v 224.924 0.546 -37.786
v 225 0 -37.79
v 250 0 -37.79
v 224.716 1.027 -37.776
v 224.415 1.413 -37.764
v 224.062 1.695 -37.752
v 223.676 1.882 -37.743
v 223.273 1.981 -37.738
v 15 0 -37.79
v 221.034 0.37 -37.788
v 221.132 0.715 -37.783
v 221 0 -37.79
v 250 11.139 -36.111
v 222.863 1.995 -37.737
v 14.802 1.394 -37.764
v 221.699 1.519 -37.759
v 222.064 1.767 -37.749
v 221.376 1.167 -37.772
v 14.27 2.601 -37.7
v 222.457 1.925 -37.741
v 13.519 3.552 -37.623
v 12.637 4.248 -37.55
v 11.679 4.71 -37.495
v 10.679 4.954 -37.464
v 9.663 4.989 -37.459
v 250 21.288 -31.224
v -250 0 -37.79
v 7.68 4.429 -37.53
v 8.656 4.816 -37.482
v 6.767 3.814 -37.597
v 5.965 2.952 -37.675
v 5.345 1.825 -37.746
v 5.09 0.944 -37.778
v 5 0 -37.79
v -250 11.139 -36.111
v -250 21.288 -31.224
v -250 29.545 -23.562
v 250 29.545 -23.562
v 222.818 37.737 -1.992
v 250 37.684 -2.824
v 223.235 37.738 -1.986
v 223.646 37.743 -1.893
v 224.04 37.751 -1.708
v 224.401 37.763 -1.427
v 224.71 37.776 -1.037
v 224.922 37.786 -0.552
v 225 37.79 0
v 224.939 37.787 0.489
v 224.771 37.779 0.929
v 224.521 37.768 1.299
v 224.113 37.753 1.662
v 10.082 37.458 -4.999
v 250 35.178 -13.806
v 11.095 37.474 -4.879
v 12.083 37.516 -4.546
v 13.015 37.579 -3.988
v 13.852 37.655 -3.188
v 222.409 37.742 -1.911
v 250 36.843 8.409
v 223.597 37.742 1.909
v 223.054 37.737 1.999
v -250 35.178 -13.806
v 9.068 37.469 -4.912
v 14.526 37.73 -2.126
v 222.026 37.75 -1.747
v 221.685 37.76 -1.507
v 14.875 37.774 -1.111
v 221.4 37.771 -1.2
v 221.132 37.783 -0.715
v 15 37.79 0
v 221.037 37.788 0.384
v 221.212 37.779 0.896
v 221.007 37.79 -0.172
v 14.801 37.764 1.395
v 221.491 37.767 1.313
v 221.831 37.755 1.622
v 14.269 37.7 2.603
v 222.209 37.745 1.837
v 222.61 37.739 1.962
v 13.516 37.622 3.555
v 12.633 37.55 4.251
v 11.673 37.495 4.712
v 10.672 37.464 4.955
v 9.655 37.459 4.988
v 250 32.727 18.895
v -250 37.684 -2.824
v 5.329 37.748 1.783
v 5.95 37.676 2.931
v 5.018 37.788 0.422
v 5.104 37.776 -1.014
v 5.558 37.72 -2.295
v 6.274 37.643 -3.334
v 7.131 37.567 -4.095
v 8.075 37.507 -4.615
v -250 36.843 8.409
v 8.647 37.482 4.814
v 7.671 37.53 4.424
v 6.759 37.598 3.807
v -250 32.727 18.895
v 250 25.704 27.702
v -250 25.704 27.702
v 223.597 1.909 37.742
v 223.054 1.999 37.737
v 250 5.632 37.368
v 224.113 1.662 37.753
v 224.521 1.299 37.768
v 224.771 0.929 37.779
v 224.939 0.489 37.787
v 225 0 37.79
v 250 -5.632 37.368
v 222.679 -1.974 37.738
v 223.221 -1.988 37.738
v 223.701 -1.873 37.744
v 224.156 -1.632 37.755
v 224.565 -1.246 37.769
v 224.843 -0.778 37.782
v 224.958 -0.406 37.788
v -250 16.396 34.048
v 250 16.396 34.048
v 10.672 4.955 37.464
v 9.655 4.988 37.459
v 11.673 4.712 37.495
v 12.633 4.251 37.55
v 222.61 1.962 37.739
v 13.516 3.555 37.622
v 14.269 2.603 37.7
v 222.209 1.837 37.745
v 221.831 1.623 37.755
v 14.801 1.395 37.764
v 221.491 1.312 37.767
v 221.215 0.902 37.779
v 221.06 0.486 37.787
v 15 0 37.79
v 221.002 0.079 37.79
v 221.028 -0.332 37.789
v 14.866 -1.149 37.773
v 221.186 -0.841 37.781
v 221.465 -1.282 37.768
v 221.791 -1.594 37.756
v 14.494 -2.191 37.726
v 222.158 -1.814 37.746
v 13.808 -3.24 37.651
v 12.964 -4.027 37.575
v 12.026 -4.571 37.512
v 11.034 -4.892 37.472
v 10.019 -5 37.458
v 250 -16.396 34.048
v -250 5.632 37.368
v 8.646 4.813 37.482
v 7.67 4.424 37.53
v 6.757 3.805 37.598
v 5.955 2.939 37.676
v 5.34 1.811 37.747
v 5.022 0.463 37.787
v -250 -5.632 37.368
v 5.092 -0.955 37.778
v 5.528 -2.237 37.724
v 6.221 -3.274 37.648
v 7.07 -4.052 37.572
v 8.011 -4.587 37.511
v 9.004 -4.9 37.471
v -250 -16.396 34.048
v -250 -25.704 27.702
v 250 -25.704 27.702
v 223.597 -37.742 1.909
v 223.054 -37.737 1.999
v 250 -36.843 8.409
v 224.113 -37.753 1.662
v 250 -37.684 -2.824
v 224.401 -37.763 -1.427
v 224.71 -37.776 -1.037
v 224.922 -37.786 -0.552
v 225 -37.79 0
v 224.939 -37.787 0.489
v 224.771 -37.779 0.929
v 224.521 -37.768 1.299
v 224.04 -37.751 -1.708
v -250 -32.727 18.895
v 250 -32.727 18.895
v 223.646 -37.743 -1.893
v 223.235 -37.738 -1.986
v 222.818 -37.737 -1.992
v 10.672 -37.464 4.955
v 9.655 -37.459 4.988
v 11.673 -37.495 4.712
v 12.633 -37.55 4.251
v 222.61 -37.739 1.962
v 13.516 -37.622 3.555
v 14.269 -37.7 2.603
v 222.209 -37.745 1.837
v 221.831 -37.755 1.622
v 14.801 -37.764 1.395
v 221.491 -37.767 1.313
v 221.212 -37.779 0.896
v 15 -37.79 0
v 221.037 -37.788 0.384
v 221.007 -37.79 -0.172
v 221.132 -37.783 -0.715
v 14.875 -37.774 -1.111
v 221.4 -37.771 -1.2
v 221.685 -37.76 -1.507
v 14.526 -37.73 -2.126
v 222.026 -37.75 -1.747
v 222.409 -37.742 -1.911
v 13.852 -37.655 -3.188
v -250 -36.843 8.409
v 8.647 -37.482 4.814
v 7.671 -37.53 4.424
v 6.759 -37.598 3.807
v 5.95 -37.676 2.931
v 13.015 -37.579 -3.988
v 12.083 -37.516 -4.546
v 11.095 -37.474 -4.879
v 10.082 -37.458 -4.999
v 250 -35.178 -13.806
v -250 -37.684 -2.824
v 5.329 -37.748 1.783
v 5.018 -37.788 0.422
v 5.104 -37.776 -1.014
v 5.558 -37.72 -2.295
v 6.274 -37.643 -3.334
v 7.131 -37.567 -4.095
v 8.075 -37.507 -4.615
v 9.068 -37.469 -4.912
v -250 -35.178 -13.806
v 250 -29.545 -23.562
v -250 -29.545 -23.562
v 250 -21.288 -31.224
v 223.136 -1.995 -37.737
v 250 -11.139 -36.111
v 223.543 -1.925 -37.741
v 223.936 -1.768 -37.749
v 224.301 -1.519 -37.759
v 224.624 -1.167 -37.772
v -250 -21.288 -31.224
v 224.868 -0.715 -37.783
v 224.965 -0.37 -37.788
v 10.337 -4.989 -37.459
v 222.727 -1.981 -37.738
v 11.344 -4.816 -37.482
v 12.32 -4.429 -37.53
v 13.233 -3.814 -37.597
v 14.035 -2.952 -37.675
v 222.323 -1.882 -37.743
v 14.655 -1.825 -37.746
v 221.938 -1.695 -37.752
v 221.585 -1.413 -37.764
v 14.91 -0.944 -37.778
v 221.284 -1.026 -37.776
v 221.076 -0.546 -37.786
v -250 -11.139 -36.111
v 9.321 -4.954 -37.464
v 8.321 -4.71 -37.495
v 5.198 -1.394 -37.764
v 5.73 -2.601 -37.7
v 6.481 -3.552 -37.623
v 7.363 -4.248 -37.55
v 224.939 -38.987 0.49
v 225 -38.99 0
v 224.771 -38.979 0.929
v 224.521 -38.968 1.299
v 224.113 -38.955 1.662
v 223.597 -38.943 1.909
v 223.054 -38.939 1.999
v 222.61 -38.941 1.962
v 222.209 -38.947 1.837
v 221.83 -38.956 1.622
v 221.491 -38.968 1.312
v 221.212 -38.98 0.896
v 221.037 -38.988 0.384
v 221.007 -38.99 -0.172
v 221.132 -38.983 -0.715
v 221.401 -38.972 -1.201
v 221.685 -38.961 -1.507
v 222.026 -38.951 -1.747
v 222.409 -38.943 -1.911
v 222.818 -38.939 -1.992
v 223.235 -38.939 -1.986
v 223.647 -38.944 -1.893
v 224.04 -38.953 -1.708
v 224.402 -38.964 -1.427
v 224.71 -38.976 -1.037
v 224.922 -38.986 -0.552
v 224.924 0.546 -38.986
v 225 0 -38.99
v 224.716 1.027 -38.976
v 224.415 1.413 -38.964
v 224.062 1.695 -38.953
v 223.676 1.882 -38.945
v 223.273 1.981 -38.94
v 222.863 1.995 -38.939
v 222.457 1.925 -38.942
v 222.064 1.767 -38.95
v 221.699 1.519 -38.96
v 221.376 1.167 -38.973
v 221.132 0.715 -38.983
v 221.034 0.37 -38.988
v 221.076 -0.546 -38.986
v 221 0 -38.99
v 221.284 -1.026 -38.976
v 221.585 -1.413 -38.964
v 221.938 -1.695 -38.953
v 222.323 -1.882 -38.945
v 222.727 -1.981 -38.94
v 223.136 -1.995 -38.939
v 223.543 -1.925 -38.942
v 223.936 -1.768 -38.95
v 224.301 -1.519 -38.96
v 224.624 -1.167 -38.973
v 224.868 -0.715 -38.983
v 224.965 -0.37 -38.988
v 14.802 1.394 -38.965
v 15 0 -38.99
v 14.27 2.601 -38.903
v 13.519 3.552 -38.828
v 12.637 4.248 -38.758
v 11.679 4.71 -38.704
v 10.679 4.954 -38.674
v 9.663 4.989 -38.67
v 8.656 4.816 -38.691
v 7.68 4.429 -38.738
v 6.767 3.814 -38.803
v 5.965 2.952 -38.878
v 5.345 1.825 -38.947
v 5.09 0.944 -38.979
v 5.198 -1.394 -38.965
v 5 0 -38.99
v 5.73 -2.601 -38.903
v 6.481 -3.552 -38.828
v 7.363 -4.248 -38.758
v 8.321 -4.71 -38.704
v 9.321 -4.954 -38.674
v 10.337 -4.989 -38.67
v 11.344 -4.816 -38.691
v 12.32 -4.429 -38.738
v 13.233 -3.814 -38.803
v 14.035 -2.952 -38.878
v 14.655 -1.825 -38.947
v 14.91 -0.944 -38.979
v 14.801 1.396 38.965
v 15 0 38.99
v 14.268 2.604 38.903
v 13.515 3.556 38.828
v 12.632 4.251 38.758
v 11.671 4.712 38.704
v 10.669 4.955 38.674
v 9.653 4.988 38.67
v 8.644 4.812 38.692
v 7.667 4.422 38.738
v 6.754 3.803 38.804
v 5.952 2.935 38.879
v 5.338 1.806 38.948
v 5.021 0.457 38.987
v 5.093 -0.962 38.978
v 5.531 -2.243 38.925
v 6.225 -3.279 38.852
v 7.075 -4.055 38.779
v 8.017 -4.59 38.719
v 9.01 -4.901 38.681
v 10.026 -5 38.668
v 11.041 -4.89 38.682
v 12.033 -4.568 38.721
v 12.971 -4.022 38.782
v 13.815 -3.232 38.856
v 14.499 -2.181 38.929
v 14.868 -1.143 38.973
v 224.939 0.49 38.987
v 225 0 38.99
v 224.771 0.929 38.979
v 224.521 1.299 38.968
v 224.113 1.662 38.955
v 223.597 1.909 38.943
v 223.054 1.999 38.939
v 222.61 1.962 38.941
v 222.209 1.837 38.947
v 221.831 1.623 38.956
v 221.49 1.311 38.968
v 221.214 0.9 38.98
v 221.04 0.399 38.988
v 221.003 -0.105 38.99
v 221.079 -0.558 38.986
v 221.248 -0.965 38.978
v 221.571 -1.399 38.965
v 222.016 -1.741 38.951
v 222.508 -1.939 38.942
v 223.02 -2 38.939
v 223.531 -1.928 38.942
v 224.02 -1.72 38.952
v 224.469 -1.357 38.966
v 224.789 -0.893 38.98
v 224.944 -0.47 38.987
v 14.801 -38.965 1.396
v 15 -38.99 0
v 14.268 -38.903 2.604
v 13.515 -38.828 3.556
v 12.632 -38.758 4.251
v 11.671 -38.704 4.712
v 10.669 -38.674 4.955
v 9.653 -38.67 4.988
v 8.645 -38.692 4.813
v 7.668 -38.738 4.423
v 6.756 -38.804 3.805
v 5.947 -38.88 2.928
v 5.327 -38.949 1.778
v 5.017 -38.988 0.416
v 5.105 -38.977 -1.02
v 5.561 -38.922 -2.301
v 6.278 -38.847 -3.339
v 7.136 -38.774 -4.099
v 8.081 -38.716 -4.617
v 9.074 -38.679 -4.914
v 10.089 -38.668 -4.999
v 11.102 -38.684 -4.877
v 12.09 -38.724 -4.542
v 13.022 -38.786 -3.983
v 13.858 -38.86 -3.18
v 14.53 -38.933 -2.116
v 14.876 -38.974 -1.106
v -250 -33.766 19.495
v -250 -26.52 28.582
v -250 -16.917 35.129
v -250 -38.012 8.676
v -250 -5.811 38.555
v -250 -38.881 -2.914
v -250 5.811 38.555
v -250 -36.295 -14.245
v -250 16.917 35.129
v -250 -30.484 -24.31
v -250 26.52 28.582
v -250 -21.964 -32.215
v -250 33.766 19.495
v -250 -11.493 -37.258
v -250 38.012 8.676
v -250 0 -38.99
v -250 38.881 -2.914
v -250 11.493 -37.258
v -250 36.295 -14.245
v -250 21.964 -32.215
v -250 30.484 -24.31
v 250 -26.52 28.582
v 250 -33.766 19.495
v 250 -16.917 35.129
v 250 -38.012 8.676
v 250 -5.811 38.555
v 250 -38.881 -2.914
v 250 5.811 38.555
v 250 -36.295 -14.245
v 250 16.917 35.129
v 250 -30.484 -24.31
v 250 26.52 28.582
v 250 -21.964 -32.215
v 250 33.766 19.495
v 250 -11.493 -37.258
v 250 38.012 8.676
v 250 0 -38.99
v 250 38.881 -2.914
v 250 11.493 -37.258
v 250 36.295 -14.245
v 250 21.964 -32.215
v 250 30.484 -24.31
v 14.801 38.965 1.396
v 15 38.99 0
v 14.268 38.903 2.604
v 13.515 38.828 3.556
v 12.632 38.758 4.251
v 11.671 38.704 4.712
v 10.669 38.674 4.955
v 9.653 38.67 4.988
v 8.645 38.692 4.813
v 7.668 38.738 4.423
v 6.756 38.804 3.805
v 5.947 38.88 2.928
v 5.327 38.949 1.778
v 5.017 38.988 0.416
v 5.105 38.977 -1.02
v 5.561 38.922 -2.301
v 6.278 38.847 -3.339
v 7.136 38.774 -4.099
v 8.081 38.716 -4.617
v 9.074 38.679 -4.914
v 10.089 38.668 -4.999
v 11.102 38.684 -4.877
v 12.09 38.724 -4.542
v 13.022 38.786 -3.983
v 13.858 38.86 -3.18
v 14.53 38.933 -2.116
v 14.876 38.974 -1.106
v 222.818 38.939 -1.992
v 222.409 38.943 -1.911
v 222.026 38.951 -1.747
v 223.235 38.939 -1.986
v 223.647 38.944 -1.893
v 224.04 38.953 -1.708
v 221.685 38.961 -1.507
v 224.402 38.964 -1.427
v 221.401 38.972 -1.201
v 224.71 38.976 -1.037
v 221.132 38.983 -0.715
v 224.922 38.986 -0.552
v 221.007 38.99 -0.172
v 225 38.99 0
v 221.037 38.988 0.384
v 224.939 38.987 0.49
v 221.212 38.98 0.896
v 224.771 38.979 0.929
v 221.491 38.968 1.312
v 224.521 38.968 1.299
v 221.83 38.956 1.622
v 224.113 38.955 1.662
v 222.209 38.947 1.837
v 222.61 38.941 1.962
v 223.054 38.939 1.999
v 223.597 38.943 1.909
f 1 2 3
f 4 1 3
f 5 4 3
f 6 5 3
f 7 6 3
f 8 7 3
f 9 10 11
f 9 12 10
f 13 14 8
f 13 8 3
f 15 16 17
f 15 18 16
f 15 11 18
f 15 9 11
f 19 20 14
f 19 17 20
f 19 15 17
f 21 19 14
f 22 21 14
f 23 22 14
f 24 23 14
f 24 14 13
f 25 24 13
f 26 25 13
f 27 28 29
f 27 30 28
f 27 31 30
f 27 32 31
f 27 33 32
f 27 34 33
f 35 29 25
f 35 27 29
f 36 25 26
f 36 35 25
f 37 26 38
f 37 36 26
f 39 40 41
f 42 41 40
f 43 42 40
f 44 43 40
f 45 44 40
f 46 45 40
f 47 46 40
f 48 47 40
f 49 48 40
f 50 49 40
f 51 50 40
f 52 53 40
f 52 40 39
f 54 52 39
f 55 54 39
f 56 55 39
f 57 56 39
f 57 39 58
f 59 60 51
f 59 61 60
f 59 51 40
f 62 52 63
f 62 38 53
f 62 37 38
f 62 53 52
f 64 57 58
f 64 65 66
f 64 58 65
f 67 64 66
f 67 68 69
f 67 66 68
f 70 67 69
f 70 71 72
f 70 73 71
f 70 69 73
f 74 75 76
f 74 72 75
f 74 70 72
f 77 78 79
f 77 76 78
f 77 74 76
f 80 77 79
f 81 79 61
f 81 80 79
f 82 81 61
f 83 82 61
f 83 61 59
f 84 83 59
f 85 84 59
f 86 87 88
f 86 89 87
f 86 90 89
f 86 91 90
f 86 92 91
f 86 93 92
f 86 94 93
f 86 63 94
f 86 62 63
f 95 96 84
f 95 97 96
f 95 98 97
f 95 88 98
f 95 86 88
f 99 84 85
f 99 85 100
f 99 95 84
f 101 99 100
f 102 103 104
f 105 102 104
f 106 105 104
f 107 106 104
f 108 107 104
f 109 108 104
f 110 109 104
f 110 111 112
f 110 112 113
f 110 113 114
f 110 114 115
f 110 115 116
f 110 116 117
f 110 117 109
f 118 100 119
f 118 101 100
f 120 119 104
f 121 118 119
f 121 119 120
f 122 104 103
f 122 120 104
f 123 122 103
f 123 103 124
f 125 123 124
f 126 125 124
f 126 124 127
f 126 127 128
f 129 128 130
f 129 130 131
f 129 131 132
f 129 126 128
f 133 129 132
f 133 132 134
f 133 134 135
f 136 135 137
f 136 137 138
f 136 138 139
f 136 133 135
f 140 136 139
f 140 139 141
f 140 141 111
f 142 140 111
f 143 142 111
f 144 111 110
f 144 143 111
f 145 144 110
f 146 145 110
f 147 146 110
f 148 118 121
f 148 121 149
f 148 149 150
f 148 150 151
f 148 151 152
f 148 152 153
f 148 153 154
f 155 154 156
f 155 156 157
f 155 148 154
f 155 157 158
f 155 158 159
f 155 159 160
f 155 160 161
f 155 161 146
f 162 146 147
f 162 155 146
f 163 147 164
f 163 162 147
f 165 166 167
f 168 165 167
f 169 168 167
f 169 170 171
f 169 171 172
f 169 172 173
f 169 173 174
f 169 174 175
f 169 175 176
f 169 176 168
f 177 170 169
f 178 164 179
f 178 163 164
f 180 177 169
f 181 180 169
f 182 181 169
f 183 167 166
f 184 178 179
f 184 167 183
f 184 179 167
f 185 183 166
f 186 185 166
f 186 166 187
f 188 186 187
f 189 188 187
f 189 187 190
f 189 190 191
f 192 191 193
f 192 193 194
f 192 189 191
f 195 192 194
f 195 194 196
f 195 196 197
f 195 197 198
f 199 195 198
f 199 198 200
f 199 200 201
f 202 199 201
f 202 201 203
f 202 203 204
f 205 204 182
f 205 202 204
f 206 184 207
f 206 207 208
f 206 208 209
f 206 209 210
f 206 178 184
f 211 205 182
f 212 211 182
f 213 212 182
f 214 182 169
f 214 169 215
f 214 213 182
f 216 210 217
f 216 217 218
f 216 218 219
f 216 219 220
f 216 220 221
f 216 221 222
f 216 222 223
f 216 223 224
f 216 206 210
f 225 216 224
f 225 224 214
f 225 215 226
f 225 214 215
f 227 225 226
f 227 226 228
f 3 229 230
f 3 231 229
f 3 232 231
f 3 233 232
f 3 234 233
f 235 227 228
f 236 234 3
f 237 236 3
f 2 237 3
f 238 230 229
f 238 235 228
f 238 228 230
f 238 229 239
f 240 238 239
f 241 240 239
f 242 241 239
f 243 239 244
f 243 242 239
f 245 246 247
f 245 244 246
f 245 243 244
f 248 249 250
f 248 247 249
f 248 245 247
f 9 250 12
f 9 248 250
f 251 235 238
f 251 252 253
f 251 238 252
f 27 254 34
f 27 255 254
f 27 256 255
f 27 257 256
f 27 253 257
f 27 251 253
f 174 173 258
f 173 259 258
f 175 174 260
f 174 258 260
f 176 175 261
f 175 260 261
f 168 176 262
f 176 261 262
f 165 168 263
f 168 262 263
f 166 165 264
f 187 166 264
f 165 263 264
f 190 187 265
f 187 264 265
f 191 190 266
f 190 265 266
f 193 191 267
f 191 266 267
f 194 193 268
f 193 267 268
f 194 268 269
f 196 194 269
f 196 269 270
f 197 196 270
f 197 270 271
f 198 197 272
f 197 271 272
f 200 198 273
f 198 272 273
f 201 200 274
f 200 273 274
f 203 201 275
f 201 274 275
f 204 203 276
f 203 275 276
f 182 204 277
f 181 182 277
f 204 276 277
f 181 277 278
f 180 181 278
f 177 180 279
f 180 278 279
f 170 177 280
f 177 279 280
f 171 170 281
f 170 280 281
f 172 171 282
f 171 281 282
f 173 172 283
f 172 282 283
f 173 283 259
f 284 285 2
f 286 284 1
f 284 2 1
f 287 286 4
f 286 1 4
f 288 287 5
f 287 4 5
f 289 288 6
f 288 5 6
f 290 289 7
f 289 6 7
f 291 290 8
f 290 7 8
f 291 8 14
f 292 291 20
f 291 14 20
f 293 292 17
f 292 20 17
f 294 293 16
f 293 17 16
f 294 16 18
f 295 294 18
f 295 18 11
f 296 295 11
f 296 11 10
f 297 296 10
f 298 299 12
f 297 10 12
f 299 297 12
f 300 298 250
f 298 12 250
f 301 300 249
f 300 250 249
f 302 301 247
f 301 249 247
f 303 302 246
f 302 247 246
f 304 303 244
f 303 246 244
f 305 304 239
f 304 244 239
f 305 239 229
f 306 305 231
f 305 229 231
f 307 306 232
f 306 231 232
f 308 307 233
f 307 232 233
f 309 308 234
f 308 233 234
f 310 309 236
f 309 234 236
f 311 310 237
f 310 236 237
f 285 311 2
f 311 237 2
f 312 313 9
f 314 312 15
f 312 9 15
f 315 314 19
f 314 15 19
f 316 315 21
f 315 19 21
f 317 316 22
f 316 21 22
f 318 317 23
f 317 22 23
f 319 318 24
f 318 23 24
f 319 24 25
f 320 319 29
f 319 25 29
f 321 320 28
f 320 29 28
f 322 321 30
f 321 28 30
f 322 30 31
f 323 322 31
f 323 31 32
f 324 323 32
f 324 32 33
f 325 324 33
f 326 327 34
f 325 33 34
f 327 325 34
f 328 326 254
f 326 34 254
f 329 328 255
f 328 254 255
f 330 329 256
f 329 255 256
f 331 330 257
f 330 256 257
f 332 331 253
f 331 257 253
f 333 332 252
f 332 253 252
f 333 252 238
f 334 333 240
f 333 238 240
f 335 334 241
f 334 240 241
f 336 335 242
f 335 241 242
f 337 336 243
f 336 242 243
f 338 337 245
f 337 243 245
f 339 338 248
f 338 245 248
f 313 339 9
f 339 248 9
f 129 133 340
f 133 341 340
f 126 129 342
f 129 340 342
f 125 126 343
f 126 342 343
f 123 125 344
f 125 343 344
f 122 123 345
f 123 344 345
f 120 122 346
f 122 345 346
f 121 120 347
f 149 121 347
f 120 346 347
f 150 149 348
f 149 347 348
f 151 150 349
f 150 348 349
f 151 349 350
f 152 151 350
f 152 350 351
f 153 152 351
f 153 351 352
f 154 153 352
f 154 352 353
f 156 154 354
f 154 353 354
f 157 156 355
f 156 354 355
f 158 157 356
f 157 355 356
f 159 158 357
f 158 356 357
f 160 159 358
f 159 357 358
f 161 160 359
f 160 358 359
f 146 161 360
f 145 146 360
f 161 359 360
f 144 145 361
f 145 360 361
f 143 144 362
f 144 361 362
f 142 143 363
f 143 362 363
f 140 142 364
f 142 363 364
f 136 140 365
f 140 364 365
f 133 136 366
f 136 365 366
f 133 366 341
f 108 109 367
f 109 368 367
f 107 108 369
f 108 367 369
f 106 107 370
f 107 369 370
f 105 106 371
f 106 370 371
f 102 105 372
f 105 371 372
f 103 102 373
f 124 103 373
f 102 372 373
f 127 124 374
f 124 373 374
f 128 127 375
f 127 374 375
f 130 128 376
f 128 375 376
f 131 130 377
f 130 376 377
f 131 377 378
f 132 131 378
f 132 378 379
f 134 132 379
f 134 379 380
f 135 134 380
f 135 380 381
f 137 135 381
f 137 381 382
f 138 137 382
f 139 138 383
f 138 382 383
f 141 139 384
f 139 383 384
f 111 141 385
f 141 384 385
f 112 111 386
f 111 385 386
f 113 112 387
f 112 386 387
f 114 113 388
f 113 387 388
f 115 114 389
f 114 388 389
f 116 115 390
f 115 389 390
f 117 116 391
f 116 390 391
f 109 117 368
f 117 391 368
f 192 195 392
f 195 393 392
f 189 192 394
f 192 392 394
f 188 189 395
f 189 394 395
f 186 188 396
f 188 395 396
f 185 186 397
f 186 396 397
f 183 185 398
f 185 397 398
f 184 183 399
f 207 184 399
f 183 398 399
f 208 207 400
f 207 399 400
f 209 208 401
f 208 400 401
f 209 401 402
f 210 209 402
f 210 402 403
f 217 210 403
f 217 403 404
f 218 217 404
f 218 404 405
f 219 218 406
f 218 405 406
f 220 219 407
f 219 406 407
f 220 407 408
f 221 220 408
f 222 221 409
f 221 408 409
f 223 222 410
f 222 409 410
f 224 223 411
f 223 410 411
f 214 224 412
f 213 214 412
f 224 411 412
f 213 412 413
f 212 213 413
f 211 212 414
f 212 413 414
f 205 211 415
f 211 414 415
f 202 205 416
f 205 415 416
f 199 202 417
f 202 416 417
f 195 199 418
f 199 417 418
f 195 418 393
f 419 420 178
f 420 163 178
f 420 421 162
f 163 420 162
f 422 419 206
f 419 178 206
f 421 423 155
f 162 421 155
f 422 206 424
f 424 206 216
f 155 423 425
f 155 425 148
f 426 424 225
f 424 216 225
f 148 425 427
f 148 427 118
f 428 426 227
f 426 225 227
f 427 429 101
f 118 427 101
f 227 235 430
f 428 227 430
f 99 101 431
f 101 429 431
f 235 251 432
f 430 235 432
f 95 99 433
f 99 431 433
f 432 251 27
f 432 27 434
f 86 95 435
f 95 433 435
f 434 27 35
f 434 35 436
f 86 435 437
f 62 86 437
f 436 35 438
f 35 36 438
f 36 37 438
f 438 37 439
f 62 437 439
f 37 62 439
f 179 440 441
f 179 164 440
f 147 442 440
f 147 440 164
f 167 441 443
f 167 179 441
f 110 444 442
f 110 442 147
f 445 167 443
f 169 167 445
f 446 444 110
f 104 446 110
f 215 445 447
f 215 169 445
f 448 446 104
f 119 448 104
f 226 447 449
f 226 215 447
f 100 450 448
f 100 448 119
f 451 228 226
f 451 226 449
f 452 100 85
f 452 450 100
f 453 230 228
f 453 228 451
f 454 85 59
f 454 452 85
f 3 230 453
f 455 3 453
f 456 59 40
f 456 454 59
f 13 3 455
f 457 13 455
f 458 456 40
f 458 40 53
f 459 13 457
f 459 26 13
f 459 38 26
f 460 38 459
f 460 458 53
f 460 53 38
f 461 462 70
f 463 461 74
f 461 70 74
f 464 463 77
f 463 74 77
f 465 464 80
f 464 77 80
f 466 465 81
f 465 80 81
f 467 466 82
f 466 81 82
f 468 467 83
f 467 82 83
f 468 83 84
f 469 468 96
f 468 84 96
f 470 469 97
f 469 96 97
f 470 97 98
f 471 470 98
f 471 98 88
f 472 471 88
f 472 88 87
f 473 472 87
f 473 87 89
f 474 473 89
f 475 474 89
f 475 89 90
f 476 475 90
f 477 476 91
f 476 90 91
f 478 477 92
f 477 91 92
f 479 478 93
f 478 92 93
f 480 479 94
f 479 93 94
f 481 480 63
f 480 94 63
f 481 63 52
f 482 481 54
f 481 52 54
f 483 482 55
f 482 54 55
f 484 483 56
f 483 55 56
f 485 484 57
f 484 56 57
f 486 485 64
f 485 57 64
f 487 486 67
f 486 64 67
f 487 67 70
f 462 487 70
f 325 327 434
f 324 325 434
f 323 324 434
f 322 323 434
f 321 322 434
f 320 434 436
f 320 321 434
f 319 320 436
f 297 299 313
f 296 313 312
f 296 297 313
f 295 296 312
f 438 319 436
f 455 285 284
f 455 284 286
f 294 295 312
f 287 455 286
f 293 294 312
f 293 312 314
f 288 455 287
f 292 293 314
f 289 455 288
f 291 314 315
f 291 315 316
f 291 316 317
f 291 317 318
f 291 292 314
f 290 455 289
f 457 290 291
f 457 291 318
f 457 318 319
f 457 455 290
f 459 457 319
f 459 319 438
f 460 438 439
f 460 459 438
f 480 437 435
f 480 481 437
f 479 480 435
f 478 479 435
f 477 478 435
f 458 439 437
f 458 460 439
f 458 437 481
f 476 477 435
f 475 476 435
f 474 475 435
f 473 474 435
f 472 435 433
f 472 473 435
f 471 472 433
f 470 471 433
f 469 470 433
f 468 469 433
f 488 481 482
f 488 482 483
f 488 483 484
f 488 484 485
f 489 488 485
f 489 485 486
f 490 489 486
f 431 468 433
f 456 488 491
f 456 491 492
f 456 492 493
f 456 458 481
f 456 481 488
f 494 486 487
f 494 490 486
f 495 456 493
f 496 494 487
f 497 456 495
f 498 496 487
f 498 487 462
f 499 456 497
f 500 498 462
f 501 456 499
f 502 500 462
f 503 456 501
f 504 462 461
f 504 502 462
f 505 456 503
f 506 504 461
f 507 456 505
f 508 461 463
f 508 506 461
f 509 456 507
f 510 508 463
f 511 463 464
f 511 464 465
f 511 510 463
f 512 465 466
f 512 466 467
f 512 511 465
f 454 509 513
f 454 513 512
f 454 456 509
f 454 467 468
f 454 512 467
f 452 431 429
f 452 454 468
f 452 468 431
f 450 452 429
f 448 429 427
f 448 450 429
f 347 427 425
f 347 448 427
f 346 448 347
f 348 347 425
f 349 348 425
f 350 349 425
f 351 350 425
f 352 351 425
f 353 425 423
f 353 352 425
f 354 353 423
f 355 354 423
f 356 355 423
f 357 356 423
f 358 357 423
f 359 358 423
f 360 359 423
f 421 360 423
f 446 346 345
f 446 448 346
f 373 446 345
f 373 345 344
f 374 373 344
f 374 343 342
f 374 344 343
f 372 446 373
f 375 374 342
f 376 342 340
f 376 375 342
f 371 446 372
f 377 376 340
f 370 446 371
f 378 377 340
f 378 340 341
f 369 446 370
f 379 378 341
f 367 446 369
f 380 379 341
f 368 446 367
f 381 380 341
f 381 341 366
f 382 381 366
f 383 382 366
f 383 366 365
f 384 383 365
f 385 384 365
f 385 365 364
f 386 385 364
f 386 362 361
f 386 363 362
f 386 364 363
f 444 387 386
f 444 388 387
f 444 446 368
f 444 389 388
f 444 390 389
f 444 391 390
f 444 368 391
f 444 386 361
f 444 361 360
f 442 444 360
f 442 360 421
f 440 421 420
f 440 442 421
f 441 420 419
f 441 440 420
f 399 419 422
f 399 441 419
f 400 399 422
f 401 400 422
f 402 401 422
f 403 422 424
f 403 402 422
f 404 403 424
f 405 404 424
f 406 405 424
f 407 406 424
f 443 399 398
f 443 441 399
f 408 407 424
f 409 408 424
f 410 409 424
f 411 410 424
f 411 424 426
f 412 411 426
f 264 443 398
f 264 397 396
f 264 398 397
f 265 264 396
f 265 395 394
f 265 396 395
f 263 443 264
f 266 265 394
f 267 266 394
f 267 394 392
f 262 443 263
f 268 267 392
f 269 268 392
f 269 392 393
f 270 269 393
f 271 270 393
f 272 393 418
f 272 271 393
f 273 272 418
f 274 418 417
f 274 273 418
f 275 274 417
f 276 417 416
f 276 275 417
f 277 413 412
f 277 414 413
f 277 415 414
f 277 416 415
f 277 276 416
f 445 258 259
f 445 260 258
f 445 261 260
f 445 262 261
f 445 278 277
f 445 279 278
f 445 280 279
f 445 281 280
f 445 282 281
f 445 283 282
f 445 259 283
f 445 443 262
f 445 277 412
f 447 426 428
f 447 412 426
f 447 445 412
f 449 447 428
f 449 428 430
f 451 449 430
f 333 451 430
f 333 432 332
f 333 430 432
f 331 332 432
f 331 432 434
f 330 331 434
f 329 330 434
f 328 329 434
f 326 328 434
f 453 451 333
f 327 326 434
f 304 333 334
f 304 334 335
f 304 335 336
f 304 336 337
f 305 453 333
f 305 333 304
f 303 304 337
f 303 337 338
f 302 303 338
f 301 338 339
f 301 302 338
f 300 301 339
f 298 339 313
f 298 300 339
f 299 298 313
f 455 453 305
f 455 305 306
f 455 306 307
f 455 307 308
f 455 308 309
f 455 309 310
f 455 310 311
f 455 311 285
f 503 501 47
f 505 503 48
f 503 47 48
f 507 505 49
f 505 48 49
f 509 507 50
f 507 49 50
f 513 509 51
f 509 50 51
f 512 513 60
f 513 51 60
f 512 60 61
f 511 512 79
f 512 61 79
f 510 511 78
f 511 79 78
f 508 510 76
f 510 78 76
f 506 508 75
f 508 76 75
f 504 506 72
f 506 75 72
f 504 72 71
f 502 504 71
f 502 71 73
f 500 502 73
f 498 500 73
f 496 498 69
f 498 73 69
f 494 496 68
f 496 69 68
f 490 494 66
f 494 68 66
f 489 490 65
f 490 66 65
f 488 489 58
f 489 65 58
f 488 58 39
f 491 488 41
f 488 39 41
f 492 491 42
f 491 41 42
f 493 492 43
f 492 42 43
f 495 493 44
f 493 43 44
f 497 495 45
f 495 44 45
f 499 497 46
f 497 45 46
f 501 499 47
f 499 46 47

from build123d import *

# Parameters (mm, degrees)
CROQUIS1_R              = 38.99
CROQUIS1_R_2            = 37.79
SALIENTE_EXTRUIR1_DEPTH = 250
CROQUIS3_R              = 5
CORTAR_EXTRUIR1_DEPTH   = 39.99
MATRIZC4_COUNT          = 2
MATRIZC4_ANGLE          = 90
CROQUIS4_R              = 2
CORTAR_EXTRUIR2_DEPTH   = 39.9900001
MATRIZC5_COUNT          = 2
MATRIZC5_ANGLE          = 90


with BuildPart() as part:
    # Croquis1 → Saliente-Extruir1 (new body, symmetric)
    with BuildSketch(Plane(origin=(0, 0, 0), x_dir=(0, 0, -1), z_dir=(1, 0, 0))):
        Circle(CROQUIS1_R)
        Circle(CROQUIS1_R_2, mode=Mode.SUBTRACT)
    extrude(amount=SALIENTE_EXTRUIR1_DEPTH, both=True)

    # Croquis3 → Cortar-Extruir1 (cut, symmetric)
    with BuildSketch(Plane.XY):
        with Locations((10, 0)):
            Circle(CROQUIS3_R)
    cortar_extruir1 = extrude(amount=CORTAR_EXTRUIR1_DEPTH, both=True, mode=Mode.SUBTRACT)

    # MatrizC4: Cortar-Extruir1 ×2 about axis
    matrizc4_axis = Axis((250, 0, 0), (1, 0, 0))
    for i in range(1, MATRIZC4_COUNT):
        add(cortar_extruir1.rotate(matrizc4_axis, i * MATRIZC4_ANGLE / (MATRIZC4_COUNT - 1)), mode=Mode.SUBTRACT)

    # Croquis4 → Cortar-Extruir2 (cut, symmetric)
    with BuildSketch(Plane.XY):
        with Locations((223, 0)):
            Circle(CROQUIS4_R)
    cortar_extruir2 = extrude(amount=CORTAR_EXTRUIR2_DEPTH, both=True, mode=Mode.SUBTRACT)

    # MatrizC5: Cortar-Extruir2 ×2 about axis
    matrizc5_axis = Axis((250, 0, 0), (1, 0, 0))
    for i in range(1, MATRIZC5_COUNT):
        add(cortar_extruir2.rotate(matrizc5_axis, i * MATRIZC5_ANGLE / (MATRIZC5_COUNT - 1)), mode=Mode.SUBTRACT)


solid = part.part
